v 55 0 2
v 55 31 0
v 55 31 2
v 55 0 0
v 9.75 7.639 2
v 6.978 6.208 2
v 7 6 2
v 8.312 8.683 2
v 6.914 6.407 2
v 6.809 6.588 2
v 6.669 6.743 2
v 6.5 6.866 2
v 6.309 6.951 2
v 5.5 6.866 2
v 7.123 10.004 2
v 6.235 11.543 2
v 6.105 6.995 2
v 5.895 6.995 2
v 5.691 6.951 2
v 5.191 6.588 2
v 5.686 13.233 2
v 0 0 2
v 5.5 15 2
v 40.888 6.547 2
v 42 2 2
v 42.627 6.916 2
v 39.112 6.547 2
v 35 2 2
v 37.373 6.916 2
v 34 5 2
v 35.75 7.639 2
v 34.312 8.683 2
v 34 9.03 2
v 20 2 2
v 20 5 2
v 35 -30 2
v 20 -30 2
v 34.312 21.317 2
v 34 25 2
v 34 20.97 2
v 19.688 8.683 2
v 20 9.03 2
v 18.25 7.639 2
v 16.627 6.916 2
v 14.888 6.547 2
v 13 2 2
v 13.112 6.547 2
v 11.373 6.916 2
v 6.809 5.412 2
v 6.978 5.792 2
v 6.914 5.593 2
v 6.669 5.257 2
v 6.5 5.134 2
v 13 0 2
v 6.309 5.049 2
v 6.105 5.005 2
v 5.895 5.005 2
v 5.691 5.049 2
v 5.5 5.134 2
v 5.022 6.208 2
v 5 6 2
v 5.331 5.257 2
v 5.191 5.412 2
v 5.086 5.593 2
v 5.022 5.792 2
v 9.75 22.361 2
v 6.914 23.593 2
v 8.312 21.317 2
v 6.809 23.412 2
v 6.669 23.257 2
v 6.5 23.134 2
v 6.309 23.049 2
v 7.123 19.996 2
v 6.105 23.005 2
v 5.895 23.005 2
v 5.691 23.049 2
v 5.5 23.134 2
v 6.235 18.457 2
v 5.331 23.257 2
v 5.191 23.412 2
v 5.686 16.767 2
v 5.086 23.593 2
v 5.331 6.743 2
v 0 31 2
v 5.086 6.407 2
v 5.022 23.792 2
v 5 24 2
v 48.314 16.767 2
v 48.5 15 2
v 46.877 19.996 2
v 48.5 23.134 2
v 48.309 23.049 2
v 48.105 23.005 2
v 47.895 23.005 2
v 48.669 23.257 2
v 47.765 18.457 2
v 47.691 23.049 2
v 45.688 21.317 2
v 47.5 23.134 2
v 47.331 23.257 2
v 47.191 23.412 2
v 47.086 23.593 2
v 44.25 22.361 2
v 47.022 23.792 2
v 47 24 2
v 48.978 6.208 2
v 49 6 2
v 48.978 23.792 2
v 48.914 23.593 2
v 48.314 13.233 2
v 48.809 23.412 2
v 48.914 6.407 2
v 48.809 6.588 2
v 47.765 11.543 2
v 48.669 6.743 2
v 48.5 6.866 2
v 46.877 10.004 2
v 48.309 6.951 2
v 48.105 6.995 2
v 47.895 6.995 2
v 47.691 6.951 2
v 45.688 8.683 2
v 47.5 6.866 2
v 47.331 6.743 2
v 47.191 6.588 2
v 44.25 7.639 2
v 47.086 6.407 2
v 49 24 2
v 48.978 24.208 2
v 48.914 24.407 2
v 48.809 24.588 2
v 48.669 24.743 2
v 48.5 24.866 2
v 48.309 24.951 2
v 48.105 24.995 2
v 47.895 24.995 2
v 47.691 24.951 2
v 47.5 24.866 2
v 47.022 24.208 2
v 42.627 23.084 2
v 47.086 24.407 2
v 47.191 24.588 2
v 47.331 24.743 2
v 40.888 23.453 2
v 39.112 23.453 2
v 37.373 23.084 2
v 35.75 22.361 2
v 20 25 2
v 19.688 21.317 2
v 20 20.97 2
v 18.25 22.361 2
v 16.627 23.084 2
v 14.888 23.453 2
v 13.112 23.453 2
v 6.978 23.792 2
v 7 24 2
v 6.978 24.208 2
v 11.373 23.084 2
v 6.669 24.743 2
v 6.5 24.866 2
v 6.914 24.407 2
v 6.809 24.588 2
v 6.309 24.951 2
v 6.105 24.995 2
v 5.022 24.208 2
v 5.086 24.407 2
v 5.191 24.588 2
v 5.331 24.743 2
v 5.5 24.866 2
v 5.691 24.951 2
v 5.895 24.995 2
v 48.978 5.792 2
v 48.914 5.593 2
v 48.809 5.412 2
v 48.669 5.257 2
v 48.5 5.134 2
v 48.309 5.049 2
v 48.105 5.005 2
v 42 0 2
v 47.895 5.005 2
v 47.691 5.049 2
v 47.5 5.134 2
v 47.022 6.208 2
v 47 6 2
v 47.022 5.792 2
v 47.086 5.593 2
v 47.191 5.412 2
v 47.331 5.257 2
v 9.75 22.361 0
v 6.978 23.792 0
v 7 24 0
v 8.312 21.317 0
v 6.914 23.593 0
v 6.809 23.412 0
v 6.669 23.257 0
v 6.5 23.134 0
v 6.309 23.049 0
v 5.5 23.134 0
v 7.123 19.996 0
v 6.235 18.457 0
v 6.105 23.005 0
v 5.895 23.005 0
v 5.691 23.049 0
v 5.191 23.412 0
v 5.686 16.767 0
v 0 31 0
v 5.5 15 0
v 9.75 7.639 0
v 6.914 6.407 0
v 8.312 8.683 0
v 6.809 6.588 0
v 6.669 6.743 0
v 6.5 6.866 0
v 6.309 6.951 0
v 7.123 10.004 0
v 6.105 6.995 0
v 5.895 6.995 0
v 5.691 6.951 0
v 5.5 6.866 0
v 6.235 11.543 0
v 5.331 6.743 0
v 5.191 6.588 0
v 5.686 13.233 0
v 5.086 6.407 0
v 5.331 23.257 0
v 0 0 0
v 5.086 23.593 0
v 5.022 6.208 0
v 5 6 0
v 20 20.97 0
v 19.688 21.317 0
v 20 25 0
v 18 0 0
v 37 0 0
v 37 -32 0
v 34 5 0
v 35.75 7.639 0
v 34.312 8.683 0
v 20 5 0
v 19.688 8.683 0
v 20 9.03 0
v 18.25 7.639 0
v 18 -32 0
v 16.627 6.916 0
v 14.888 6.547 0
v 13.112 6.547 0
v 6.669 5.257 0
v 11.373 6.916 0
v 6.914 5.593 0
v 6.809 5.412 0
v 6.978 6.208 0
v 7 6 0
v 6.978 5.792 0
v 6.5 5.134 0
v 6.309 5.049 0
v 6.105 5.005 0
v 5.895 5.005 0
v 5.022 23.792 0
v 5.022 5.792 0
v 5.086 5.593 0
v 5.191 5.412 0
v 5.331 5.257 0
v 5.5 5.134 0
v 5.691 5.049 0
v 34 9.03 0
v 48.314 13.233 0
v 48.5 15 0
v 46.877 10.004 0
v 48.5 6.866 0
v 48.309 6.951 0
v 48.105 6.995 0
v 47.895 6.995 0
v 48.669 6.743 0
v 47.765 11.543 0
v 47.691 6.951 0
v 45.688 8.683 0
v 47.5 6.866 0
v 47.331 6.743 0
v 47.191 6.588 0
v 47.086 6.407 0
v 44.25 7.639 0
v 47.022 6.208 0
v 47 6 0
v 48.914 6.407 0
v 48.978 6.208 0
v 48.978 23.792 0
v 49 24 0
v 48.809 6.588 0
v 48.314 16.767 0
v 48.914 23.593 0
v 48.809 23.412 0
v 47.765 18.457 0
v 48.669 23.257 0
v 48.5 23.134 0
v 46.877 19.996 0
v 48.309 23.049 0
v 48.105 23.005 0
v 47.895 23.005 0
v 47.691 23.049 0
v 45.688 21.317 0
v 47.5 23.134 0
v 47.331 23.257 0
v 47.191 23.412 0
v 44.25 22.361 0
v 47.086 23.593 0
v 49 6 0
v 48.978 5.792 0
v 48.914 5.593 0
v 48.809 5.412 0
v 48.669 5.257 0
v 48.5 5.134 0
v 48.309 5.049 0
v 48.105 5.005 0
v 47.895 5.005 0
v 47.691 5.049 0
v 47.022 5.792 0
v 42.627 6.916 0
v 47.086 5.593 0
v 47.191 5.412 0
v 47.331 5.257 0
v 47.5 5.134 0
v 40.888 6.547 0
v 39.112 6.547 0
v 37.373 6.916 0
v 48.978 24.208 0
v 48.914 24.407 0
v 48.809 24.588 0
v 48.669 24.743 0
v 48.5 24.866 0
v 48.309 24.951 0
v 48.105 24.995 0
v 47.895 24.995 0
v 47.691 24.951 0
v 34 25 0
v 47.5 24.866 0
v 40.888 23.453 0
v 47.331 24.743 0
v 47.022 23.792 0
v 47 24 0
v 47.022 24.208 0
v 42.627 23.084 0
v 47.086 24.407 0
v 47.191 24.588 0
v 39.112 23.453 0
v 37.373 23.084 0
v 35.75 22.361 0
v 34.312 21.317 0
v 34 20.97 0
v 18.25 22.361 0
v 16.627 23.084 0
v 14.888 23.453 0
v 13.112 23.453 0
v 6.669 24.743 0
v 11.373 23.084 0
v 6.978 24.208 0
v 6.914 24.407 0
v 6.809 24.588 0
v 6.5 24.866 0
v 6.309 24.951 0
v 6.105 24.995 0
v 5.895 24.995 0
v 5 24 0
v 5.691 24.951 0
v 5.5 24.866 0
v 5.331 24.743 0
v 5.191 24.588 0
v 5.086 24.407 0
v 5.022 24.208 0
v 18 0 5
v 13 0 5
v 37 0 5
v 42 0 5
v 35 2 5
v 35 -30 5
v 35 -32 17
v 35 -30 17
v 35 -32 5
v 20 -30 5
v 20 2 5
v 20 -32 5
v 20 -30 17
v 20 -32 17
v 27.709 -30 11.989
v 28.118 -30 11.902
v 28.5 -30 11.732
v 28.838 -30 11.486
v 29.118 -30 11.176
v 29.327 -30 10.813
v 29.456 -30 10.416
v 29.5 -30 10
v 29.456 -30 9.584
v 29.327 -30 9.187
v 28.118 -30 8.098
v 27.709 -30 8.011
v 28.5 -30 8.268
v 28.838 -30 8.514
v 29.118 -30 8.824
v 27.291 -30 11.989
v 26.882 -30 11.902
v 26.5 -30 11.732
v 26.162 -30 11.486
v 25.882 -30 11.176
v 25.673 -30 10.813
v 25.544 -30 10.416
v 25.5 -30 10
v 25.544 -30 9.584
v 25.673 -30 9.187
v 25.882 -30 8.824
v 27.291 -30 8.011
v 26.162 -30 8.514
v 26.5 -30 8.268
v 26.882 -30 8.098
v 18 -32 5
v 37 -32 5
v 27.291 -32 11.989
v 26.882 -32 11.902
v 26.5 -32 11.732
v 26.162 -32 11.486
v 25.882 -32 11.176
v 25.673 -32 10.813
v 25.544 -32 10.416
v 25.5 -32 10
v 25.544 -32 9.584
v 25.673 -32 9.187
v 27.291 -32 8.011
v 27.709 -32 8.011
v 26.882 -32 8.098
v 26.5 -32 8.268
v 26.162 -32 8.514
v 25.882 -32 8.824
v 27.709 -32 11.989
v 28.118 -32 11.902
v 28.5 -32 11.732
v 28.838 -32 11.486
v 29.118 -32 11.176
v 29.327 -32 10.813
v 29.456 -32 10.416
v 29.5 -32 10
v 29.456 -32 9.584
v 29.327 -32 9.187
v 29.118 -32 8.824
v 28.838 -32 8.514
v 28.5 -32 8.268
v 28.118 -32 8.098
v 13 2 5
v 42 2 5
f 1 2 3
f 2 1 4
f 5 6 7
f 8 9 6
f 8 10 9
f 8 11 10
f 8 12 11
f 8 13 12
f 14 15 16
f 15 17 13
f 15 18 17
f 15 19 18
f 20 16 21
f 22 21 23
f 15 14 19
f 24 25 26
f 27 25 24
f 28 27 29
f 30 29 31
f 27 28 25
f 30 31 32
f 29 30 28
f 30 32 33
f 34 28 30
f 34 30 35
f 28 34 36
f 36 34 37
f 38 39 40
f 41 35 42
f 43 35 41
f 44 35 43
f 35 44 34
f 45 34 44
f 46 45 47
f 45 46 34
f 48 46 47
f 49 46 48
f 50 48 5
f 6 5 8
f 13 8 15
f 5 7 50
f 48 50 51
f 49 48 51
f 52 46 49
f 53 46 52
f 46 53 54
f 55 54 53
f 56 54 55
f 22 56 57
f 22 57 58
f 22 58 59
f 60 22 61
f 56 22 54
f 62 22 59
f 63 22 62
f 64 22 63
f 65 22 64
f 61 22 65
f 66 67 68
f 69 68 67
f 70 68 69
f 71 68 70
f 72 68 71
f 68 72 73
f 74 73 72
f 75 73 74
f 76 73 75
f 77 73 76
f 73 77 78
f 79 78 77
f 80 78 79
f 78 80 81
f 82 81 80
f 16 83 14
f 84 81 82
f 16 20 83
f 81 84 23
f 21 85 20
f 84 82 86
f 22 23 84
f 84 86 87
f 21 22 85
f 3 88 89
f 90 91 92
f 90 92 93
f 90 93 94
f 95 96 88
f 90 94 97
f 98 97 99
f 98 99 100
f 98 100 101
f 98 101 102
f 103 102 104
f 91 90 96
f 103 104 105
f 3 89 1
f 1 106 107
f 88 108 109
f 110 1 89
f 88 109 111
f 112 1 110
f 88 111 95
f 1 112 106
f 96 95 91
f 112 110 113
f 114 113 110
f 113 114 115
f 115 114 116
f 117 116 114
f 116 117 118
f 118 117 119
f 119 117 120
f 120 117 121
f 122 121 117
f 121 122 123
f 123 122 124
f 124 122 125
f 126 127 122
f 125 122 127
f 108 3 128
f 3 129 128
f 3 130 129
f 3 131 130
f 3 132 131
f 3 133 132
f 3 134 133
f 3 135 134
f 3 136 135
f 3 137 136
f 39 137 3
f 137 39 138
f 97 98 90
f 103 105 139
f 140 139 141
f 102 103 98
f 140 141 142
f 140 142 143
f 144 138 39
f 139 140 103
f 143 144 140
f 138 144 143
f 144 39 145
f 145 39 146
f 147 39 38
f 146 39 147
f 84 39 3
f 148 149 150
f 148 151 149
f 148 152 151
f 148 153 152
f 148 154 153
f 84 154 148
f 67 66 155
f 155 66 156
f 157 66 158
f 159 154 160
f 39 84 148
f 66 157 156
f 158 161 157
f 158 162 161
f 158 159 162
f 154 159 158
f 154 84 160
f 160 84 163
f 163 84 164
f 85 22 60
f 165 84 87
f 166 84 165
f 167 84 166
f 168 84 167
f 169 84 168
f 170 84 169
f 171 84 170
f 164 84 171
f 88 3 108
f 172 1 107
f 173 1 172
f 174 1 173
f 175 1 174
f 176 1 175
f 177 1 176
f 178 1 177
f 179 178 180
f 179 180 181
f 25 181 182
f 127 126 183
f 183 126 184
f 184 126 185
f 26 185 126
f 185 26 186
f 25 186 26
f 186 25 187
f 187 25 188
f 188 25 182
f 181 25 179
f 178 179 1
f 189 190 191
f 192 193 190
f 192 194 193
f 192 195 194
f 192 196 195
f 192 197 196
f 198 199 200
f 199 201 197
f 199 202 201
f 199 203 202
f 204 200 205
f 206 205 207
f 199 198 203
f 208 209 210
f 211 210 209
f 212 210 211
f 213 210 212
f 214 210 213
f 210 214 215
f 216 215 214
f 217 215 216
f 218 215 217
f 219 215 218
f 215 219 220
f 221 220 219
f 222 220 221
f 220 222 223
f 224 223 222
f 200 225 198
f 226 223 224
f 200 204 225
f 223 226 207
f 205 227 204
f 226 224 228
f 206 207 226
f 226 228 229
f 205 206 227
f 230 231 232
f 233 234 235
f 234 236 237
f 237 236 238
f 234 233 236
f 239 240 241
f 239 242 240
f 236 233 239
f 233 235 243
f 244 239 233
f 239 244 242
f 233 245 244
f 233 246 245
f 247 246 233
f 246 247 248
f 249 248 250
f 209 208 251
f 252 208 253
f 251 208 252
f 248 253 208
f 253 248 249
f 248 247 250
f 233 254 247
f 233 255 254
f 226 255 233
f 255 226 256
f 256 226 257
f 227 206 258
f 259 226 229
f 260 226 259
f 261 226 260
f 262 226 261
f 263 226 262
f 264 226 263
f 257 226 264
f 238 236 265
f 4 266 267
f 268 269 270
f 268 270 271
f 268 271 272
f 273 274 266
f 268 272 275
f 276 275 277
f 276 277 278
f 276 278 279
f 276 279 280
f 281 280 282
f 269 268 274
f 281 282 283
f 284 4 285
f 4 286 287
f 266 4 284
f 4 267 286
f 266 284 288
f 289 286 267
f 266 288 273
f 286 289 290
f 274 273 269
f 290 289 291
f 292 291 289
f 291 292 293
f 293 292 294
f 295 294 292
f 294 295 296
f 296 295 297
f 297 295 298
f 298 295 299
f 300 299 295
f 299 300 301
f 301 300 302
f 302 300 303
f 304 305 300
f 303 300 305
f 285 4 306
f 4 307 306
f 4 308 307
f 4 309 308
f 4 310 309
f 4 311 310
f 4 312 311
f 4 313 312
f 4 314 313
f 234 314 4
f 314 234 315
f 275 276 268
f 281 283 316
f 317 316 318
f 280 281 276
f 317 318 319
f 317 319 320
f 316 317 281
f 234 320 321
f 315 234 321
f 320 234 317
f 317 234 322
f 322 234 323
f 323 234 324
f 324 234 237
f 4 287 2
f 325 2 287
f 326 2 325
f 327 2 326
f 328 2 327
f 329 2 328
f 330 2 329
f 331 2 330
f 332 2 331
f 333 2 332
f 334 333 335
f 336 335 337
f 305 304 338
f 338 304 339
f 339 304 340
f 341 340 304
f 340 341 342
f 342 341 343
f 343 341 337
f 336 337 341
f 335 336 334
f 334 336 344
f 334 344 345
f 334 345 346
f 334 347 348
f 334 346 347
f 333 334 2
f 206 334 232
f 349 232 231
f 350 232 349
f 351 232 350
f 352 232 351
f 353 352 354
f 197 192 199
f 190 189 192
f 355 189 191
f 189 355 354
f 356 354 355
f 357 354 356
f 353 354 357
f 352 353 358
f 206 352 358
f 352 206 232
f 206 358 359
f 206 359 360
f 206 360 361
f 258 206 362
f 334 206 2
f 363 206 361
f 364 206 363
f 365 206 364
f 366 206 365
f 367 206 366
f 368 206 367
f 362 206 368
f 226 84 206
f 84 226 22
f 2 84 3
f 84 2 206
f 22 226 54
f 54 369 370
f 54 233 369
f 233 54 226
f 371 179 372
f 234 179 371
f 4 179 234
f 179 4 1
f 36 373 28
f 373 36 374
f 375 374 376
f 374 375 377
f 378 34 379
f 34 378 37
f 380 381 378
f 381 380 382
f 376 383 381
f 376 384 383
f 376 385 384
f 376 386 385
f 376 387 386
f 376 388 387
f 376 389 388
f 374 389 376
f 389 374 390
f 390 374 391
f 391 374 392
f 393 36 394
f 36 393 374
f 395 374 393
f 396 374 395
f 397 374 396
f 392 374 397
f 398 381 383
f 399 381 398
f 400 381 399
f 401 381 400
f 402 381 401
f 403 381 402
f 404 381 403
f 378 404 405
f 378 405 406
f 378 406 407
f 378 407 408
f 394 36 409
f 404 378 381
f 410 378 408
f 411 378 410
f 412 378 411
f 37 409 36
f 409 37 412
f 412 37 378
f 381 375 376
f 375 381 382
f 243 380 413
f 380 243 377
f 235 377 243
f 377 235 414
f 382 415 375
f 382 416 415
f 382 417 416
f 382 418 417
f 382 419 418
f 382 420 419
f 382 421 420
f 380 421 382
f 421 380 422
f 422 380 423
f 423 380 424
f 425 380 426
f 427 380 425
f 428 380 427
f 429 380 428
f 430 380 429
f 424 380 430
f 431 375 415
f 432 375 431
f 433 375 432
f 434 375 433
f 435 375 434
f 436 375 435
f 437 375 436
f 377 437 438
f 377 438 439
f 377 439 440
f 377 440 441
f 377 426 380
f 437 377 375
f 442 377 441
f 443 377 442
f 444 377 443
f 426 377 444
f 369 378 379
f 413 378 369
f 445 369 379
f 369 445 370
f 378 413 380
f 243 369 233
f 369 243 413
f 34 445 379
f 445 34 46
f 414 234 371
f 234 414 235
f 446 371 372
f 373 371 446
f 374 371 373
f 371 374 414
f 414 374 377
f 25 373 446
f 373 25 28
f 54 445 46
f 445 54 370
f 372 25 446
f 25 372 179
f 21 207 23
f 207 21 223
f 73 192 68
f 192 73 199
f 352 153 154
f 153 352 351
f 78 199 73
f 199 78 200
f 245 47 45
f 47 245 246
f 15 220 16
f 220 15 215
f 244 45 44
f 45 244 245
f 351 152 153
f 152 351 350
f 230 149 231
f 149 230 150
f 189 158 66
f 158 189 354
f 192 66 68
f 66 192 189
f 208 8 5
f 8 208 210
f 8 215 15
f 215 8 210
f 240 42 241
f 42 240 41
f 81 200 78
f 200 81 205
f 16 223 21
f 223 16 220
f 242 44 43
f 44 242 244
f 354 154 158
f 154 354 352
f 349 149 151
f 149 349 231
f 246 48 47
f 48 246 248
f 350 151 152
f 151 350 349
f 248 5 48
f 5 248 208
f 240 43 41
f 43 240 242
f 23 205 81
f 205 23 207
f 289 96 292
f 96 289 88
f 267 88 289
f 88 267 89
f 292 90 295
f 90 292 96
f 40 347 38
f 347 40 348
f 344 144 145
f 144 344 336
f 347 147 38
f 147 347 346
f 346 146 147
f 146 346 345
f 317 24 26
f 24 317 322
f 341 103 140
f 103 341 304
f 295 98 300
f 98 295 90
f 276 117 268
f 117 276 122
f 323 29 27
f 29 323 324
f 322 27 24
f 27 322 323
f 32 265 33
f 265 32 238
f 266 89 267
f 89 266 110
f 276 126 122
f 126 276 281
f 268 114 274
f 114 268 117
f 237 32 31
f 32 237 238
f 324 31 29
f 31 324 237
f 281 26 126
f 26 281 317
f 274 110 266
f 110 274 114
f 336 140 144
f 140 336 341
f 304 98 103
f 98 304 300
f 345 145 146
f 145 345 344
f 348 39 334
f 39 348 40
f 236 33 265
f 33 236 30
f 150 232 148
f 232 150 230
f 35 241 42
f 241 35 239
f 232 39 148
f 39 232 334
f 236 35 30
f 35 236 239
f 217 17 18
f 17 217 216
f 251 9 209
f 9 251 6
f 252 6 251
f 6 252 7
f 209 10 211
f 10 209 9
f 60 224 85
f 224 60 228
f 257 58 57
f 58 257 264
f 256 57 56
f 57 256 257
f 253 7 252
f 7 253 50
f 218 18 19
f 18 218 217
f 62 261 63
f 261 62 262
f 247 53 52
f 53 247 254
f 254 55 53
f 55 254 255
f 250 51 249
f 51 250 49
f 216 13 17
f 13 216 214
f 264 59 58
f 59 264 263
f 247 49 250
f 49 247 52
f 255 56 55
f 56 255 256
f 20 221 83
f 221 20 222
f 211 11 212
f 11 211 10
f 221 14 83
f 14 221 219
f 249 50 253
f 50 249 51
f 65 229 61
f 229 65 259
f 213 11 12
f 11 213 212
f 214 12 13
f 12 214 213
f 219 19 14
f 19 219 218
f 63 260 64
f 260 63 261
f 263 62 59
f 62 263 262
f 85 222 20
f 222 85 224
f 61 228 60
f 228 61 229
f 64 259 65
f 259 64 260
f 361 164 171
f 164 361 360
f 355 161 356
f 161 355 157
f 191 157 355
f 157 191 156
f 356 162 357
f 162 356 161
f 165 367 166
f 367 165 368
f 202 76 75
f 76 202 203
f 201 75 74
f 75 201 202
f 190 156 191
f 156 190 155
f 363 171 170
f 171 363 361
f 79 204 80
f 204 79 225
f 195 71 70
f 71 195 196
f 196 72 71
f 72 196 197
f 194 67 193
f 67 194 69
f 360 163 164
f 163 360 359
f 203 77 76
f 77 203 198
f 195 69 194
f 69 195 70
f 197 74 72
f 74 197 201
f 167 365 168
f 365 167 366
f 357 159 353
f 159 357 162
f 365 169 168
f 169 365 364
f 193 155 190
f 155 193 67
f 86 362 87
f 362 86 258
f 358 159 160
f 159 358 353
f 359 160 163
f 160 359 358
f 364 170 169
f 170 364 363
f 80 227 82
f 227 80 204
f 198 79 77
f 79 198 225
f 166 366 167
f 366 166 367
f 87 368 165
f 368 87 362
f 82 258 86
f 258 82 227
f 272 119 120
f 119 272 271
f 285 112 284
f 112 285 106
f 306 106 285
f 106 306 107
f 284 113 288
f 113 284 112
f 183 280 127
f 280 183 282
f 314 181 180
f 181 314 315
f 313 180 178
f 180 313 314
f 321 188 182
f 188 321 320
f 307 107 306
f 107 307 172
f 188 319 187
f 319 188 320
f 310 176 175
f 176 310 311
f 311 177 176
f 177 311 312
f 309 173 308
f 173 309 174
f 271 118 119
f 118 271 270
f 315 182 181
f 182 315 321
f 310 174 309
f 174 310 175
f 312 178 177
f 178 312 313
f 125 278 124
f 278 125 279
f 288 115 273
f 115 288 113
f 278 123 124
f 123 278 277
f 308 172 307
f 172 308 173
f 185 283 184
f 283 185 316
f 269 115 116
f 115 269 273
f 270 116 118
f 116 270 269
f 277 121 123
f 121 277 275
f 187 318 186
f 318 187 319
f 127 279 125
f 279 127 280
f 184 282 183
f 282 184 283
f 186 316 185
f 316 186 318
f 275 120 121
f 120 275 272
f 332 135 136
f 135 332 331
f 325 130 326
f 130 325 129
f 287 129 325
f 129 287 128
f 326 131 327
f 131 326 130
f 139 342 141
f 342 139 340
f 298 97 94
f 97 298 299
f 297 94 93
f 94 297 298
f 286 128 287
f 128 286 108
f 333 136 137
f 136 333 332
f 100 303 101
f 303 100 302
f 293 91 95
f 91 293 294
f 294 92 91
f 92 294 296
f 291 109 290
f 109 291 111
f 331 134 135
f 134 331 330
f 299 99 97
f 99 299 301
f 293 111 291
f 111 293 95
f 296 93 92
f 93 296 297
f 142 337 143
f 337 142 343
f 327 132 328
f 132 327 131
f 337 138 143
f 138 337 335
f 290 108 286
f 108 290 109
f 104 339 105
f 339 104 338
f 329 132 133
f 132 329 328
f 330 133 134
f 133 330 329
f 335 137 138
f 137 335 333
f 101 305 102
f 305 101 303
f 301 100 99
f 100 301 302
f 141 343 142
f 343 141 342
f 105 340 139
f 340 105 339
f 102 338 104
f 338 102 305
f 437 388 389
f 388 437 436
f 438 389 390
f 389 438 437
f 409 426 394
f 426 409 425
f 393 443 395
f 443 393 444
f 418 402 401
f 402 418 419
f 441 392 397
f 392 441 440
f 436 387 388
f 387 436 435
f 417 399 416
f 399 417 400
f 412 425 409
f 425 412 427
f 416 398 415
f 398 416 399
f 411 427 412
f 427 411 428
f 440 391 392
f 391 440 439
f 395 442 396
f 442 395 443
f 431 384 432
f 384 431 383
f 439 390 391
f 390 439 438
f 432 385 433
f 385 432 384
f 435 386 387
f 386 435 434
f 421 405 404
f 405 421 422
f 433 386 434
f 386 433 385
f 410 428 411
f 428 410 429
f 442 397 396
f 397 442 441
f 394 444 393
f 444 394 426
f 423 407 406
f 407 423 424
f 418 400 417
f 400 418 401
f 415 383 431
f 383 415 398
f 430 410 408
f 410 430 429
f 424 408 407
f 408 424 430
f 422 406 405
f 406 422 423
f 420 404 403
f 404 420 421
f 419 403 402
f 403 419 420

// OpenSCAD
difference () {
 union () {
  cube ([55, 31, 2]);
  translate ([20, -30, 0]) 
    cube ([15, 30, 2]);
  translate ([20, -32, 0]) 
    cube ([15, 2, 17]); 
  translate ([18, -32, 0]) 
    cube ([2, 34, 5]); 
  translate ([35, -32, 0]) 
    cube ([2, 34, 5]); 
  translate ([13, 0, 0]) 
    cube ([5, 2, 5]); 
  translate ([37, 0, 0]) 
    cube ([5, 2, 5]); 

}
 union () {
  translate ([14, 15, 0]) 
     cylinder  (h=2, r=8.5 , $fs=0.1 );
  translate ([40, 15, 0]) 
     cylinder  (h=2, r=8.5 , $fs=0.1 );
  translate ([20, 5, 0]) 
     cube ([14, 20, 2]);
  translate ([6, 6, 0]) 
     cylinder  (h=2, r=1 , $fs=0.1 );
  translate ([6, 24, 0]) 
     cylinder  (h=2, r=1 , $fs=0.1 );
  translate ([48, 6, 0]) 
     cylinder  (h=2, r=1 , $fs=0.1 );
  translate ([48, 24, 0]) 
     cylinder  (h=2, r=1 , $fs=0.1 );
translate ([27.5, -30, 10])  {
 rotate ([90, 0, 0])
    cylinder  (h=2, r=2, $fs=0.1);
}
}
}
